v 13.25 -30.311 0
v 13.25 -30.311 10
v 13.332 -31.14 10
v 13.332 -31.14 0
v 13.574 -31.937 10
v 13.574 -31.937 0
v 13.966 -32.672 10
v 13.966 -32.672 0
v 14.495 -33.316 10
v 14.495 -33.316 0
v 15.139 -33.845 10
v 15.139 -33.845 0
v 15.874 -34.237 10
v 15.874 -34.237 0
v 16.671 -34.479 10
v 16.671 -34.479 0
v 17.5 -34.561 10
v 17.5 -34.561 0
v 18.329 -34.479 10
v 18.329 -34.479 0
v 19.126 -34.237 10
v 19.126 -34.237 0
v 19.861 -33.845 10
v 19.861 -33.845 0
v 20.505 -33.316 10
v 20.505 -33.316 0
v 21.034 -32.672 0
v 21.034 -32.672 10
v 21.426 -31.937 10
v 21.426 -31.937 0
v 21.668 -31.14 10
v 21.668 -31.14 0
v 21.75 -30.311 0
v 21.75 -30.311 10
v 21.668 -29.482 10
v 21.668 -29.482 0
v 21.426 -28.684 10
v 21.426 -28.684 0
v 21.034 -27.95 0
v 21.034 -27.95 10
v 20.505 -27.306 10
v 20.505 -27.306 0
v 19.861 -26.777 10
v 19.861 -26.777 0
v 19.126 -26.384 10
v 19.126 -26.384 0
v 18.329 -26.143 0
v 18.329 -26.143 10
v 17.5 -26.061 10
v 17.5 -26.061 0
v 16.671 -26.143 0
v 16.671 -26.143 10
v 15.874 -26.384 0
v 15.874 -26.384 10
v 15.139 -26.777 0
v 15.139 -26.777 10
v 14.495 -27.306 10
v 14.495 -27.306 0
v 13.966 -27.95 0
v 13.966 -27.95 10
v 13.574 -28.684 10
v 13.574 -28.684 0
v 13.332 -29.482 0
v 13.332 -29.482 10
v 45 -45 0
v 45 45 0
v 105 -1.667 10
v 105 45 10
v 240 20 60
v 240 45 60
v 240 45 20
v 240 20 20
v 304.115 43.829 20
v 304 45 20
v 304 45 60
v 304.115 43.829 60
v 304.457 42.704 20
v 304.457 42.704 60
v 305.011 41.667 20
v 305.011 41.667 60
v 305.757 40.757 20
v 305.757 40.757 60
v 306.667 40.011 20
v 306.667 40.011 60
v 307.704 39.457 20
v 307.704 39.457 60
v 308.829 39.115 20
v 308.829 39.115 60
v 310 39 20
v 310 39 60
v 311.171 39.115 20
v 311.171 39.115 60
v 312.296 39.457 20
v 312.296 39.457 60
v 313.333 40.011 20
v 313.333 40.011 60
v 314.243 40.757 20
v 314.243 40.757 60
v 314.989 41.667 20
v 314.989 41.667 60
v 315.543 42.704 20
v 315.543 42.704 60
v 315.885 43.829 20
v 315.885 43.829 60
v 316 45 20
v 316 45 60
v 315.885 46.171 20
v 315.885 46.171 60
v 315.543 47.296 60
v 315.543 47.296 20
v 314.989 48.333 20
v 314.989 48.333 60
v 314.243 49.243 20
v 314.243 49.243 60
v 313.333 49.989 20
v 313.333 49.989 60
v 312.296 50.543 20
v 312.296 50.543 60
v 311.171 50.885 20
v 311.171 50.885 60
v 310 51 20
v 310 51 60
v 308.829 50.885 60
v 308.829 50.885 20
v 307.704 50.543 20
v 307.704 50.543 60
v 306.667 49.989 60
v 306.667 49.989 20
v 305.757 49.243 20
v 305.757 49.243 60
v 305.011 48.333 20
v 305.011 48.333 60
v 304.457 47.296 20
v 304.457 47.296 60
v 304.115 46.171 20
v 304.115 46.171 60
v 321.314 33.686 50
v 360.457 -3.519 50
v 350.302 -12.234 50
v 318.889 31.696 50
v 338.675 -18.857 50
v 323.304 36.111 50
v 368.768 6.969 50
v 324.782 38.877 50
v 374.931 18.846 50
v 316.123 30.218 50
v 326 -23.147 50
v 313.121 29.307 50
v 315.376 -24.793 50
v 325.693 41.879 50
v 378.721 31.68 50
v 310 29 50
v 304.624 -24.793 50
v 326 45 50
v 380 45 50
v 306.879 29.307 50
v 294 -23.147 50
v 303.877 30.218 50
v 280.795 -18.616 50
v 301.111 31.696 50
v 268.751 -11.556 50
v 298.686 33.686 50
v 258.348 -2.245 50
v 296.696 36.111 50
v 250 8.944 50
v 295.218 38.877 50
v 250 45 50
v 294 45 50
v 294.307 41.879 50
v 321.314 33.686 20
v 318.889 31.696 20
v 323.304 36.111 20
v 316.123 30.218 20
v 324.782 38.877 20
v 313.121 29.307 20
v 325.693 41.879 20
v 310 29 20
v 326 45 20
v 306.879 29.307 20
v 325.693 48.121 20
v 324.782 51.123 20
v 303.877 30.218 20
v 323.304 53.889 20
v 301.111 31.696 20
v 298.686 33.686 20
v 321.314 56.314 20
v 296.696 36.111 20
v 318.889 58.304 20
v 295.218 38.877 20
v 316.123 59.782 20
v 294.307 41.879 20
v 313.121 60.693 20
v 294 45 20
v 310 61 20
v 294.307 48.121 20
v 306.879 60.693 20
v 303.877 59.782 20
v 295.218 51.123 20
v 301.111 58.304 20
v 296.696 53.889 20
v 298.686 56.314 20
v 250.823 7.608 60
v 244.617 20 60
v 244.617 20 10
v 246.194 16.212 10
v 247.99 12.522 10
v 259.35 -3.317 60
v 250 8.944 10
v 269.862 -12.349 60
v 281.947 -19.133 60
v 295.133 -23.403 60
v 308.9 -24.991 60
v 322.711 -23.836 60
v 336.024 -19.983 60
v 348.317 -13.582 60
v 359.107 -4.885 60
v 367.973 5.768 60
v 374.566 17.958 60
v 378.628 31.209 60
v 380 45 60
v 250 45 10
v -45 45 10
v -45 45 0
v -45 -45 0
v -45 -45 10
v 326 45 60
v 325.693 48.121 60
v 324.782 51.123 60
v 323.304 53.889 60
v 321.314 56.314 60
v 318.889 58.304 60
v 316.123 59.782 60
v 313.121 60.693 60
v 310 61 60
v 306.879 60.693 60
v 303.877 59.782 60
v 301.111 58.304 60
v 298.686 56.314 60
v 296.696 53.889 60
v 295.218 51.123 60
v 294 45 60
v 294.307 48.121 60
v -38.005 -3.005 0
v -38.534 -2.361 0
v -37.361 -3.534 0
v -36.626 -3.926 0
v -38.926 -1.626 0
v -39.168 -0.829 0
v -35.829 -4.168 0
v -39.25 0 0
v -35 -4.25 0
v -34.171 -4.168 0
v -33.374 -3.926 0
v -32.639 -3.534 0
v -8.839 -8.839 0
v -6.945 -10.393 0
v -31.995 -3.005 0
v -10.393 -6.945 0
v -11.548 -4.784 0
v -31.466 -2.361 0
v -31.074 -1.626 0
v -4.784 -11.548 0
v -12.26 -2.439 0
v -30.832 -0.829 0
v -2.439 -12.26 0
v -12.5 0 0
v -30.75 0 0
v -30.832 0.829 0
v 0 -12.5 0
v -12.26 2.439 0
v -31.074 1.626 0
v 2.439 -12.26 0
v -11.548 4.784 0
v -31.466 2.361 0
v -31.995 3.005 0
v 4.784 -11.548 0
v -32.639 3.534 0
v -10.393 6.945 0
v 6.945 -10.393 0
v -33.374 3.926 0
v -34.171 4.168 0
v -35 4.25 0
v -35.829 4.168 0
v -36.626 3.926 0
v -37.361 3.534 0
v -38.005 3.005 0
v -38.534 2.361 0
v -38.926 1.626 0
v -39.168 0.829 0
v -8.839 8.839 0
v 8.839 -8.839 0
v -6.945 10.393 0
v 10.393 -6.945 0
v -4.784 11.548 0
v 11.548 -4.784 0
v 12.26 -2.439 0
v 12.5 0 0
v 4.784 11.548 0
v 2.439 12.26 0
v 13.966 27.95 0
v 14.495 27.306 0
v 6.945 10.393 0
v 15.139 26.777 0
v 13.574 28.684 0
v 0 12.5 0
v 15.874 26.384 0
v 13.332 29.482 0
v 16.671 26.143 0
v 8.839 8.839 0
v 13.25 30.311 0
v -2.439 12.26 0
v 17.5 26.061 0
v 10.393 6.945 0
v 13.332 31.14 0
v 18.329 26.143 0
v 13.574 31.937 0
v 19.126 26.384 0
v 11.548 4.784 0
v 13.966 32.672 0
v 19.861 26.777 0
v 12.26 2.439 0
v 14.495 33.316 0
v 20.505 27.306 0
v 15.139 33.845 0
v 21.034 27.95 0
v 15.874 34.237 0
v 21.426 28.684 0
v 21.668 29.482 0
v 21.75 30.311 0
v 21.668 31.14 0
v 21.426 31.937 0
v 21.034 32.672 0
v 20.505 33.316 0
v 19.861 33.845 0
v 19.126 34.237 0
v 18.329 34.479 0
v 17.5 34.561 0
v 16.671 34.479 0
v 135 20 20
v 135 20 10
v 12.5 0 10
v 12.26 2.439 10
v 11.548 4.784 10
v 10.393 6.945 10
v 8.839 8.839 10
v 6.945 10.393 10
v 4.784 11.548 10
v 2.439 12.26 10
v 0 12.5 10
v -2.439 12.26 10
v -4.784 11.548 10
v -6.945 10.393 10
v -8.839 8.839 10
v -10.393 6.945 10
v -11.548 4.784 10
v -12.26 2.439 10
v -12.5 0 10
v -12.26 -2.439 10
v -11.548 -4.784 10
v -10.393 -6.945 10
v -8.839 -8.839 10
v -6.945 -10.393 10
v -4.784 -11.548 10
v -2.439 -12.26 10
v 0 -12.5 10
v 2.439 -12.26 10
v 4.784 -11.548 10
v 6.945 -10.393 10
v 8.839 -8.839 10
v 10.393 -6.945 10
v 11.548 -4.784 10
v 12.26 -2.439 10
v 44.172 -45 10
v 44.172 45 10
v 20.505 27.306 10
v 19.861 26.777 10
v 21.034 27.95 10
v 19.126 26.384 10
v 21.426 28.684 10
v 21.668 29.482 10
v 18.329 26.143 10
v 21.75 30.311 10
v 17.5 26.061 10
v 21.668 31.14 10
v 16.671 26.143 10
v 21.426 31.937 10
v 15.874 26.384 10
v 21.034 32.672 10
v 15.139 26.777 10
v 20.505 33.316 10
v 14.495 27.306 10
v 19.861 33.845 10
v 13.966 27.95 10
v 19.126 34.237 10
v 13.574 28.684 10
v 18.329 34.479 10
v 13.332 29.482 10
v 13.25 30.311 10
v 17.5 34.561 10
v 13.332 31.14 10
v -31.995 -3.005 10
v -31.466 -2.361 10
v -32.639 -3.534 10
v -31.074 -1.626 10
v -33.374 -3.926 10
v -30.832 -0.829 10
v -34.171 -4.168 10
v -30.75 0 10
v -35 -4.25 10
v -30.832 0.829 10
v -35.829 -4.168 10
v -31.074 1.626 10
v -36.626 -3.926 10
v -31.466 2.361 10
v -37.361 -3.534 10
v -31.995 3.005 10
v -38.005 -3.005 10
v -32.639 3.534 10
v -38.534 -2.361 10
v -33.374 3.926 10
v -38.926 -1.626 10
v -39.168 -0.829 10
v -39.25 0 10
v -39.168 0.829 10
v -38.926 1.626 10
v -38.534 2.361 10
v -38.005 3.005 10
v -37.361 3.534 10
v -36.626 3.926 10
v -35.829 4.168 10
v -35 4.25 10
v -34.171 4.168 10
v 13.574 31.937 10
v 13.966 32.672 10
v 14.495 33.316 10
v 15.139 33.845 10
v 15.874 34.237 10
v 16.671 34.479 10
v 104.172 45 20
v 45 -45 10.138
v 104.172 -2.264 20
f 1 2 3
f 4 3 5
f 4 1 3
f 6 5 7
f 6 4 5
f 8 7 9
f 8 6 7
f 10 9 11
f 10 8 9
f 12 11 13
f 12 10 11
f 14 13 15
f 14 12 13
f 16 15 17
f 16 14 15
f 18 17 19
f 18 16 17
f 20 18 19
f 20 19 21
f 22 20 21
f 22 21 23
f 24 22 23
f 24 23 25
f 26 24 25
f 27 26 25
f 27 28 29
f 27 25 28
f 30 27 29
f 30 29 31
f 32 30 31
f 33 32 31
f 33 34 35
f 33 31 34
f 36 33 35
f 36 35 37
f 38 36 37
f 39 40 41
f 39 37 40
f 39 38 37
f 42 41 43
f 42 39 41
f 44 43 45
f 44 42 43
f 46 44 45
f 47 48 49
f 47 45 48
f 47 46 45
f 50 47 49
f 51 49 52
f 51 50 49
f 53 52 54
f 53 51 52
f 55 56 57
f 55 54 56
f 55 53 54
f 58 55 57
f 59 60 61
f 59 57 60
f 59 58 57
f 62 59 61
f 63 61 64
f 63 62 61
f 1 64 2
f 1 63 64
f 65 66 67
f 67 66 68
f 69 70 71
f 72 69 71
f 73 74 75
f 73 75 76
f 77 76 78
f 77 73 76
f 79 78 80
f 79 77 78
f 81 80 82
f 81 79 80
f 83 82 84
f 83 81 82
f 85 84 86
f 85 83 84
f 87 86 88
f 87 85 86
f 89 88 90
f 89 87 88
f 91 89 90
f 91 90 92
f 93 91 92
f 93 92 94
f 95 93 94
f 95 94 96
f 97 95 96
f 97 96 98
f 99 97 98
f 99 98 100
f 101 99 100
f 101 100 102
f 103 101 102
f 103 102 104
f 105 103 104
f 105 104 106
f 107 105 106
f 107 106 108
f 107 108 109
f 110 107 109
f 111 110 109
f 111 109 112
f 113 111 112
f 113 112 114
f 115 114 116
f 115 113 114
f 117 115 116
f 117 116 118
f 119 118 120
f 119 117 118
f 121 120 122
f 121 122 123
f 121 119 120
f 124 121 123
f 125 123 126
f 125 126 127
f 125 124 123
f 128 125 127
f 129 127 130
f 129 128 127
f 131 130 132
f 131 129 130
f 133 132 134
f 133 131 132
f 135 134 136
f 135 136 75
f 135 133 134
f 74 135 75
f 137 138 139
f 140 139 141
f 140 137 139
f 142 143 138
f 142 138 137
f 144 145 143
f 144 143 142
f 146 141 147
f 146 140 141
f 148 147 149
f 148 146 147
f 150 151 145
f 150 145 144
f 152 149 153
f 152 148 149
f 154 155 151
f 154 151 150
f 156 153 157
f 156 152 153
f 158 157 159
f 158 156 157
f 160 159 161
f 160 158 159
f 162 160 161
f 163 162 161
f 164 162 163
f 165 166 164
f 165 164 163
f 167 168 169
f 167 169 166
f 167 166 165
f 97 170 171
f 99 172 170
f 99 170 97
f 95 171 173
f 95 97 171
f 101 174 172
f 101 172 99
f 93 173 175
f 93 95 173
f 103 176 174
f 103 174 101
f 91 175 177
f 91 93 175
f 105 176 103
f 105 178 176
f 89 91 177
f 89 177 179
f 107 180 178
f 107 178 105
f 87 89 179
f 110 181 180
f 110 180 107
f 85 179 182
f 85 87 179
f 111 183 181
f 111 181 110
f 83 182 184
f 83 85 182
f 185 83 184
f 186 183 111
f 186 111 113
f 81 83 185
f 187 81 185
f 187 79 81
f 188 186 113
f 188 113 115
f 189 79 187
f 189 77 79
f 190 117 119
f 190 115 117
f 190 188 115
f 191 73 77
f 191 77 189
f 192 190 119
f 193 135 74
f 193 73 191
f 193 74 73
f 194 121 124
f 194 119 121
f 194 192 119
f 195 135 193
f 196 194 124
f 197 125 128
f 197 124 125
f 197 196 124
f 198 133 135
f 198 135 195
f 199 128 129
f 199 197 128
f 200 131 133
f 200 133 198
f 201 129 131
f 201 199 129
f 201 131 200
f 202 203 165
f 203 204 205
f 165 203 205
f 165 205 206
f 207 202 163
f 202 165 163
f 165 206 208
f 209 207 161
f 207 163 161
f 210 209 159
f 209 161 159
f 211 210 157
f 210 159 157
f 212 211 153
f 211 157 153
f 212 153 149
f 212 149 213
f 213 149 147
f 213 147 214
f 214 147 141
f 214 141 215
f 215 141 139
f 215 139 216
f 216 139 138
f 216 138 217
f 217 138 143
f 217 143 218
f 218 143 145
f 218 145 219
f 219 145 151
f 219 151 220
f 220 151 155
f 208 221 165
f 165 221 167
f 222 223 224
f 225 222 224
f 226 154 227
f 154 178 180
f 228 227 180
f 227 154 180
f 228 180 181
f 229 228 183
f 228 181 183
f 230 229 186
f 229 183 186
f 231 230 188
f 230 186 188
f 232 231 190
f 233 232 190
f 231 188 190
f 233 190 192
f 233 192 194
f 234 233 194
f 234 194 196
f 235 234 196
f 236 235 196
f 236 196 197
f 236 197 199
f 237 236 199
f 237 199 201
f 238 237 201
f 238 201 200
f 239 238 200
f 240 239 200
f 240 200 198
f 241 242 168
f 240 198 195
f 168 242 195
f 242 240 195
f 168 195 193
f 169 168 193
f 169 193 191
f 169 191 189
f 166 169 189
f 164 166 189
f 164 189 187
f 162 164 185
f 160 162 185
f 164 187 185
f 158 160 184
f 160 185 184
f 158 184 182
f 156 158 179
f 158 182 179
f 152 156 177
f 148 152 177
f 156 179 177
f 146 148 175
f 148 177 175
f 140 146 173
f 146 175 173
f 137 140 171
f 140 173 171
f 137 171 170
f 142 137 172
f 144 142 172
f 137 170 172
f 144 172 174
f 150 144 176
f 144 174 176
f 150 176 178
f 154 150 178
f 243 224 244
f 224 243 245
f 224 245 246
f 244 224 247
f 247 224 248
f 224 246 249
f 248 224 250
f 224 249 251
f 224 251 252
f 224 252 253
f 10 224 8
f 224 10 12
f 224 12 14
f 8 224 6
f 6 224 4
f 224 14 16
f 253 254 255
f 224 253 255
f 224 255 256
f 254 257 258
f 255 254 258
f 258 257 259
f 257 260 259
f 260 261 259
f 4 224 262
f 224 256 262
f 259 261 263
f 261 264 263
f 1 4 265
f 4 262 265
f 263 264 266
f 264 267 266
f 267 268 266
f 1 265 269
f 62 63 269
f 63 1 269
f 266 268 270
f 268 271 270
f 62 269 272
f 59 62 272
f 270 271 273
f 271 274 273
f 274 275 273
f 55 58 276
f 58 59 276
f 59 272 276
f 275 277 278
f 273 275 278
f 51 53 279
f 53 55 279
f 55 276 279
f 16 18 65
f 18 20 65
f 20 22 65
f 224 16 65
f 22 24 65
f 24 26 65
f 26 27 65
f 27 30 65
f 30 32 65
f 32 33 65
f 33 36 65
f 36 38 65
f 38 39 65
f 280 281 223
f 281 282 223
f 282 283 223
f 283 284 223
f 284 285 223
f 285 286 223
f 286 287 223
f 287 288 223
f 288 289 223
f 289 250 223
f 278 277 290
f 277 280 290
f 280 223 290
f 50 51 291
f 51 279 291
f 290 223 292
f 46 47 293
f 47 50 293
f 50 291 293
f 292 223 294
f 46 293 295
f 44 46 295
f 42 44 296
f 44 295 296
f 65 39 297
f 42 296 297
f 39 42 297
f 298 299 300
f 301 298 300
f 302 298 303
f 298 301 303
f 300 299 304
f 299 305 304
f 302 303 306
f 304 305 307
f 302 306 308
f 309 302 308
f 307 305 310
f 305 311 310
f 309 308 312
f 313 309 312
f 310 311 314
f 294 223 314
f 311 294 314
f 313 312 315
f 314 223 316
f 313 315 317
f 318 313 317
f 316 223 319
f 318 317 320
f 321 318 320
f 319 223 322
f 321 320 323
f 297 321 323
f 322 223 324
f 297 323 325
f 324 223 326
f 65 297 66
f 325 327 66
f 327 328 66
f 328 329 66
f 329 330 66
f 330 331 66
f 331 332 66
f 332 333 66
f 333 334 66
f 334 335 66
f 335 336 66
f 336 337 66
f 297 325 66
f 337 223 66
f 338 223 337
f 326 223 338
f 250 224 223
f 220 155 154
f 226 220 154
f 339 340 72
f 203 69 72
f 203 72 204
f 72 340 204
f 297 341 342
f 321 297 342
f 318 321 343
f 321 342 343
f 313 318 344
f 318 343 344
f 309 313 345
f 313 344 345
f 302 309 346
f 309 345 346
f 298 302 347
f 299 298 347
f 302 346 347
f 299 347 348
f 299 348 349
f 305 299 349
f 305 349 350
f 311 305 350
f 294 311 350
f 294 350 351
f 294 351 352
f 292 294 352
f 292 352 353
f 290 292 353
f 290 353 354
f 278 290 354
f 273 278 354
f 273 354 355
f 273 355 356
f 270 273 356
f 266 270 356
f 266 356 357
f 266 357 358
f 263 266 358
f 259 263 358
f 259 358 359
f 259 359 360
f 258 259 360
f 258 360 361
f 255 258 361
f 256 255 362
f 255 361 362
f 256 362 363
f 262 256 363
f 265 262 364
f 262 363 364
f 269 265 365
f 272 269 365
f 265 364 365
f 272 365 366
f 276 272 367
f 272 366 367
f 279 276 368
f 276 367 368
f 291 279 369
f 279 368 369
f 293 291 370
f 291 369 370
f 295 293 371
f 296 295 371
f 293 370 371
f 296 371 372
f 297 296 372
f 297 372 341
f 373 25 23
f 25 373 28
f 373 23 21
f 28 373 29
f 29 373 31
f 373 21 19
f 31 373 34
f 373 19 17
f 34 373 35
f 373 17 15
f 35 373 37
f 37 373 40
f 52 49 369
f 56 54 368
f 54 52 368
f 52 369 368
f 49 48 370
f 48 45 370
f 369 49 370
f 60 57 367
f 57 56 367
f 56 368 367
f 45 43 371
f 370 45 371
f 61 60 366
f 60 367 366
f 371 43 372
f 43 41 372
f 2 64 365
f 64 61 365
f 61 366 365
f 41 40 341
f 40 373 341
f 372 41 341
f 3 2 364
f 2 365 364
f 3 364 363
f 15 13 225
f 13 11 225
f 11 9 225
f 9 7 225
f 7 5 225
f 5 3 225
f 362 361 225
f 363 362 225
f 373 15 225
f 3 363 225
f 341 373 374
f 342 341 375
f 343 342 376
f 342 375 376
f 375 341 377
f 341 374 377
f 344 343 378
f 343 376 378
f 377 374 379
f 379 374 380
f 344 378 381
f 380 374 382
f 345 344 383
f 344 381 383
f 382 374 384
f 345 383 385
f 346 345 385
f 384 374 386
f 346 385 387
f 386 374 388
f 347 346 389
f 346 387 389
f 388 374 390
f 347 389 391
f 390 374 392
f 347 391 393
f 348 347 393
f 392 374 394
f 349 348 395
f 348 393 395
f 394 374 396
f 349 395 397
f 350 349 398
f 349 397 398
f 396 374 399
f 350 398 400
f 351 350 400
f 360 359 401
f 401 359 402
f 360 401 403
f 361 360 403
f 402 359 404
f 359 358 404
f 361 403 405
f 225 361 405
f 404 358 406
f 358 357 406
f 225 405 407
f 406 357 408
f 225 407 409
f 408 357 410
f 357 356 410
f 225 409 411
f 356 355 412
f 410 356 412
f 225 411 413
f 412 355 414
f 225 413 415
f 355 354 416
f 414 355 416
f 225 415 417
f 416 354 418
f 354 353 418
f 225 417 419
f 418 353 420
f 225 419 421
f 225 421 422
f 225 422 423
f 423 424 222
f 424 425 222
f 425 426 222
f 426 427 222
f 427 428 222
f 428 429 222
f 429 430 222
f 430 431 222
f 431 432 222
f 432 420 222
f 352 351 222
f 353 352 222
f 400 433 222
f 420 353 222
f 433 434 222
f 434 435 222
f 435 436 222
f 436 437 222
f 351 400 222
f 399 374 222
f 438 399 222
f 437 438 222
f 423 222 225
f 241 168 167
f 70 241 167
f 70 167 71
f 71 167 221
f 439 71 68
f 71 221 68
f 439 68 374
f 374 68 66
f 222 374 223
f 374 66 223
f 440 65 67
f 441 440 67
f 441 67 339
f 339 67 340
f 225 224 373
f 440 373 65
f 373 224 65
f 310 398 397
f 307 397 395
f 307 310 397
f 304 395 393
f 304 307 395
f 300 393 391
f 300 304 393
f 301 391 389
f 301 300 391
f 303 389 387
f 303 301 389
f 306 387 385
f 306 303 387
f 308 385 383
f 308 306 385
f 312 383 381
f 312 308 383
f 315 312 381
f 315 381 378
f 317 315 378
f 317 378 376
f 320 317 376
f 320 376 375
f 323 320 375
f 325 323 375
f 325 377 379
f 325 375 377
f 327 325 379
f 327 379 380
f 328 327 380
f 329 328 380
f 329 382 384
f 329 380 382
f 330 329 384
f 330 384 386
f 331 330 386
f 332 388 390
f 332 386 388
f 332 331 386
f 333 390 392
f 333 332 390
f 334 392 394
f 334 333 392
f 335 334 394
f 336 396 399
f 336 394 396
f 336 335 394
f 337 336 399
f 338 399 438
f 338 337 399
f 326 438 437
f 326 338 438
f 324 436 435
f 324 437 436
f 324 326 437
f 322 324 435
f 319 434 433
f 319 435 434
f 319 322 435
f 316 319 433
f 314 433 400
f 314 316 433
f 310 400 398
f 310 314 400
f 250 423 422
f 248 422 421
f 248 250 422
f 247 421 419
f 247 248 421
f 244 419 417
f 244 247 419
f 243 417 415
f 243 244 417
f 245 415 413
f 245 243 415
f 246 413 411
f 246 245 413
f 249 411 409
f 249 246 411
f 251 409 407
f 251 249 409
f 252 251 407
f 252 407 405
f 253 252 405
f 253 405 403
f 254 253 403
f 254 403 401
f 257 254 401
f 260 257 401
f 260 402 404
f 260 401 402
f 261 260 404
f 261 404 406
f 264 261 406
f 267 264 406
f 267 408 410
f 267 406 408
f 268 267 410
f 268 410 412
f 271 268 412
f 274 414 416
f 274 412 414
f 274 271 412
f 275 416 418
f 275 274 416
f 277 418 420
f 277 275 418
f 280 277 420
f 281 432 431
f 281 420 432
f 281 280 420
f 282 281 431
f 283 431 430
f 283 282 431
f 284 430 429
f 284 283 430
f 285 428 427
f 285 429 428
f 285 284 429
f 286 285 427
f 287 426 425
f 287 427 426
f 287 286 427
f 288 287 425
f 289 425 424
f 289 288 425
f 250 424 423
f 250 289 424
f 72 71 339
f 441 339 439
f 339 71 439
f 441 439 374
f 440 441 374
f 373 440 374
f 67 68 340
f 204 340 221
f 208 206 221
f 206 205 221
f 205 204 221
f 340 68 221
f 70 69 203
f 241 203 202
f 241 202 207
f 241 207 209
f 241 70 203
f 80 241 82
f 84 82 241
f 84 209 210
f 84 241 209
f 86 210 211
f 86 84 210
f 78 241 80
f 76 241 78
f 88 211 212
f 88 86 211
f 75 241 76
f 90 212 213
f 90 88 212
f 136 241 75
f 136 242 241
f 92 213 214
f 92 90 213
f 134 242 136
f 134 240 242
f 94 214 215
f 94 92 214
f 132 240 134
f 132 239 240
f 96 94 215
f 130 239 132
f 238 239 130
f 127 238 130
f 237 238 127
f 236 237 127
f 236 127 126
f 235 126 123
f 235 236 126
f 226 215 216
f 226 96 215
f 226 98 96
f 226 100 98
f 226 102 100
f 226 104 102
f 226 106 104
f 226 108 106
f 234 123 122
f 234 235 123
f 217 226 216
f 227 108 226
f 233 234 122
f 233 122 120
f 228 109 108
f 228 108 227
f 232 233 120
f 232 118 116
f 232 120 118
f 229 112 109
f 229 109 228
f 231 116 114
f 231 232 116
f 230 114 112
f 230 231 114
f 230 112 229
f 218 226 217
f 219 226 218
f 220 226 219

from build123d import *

# Parameters (mm, degrees)
ESQUISSE1_R             = 6
ESQUISSE1_R_2           = 4.25
BASE_EXTRUSION_DEPTH    = 60
ENL_V_MAT_EXTRU_1_DEPTH = 396.094925303
ENL_V_MAT_EXTRU_2_DEPTH = 10
ENL_V_MAT_EXTRU_3_DEPTH = 40
ESQUISSE5_R             = 12.5
ENL_V_MAT_EXTRU_4_DEPTH = 389.099214119
ESQUISSE6_R             = 16
ESQUISSE6_R_2           = 6
ENL_V_MAT_EXTRU_5_DEPTH = 10


with BuildPart() as part:
    # Esquisse1 → Base-Extrusion (new body)
    with BuildSketch(Plane.XY):
        with BuildLine():
            Line((380, 45), (326, 45))
            ThreePointArc((326, 45), (310, 61), (294, 45))
            Line((294, 45), (-45, 45))
            Line((-45, 45), (-45, -45))
            Line((-45, -45), (45, -45))
            Line((45, -45), (135, 20))
            Line((135, 20), (244.616515847, 20))
            ThreePointArc((244.616515847, 20), (322.711335675, -23.836196477), (380, 45))
        make_face()
        with Locations(Location((310, 45, 0), (0, 0, 180))):
            Circle(ESQUISSE1_R, mode=Mode.SUBTRACT)
        with Locations(Location((-35, 0, 0), (0, 0, 180))):
            Circle(ESQUISSE1_R_2, mode=Mode.SUBTRACT)
        with Locations(Location((17.5, 30.310889132, 0), (0, 0, 180))):
            Circle(ESQUISSE1_R_2, mode=Mode.SUBTRACT)
        with Locations(Location((17.5, -30.310889132, 0), (0, 0, 180))):
            Circle(ESQUISSE1_R_2, mode=Mode.SUBTRACT)
    extrude(amount=BASE_EXTRUSION_DEPTH)

    # Esquisse2 → Enlèv. mat.-Extru.1 (cut, through all)
    with BuildSketch(Plane(origin=(0, 45, 0), x_dir=(-1, 0, 0), z_dir=(0, 1, 0))):
        Polygon((-294, 50), (-294, 10), (-326, 10), (-326, 50), (-380, 50), (-380, 0), (-45, 0), (-105, 10), (-250, 10), (-250, 50), align=None)
        Polygon((-240, 60), (-240, 20), (-104.172374697, 20), (-44.172374697, 10), (45, 10), (45, 60), align=None)
    extrude(amount=-ENL_V_MAT_EXTRU_1_DEPTH, mode=Mode.SUBTRACT)

    # Esquisse3 → Enlèv. mat.-Extru.2 (cut)
    with BuildSketch(Plane(origin=(0, 0, 0), x_dir=(-1, 0, 0), z_dir=(0, 0, -1))):
        with BuildLine():
            Line((-304, 45), (-294, 45))
            ThreePointArc((-294, 45), (-310, 61), (-326, 45))
            Line((-326, 45), (-316, 45))
            ThreePointArc((-316, 45), (-310, 51), (-304, 45))
        make_face()
    extrude(amount=-ENL_V_MAT_EXTRU_2_DEPTH, mode=Mode.SUBTRACT)

    # Esquisse4 → Enlèv. mat.-Extru.3 (cut)
    with BuildSketch(Plane(origin=(0, 0, 10), x_dir=(-1, 0, 0), z_dir=(0, 0, -1))):
        with BuildLine():
            ThreePointArc((-326, -23.14690015), (-310, -25), (-294, -23.14690015))
            Line((-294, -23.14690015), (-294, 45))
            ThreePointArc((-294, 45), (-310, 29), (-326, 45))
            Line((-326, 45), (-326, -23.14690015))
        make_face()
    extrude(amount=-ENL_V_MAT_EXTRU_3_DEPTH, mode=Mode.SUBTRACT)

    # Esquisse5 → Enlèv. mat.-Extru.4 (cut, through all)
    with BuildSketch(Plane.XY.offset(10)):
        Circle(ESQUISSE5_R)
    extrude(amount=-ENL_V_MAT_EXTRU_4_DEPTH, mode=Mode.SUBTRACT)

    # Esquisse6 → Enlèv. mat.-Extru.5 (cut)
    with BuildSketch(Plane(origin=(0, 0, 10), x_dir=(-1, 0, 0), z_dir=(0, 0, -1))):
        with Locations((-310, 45)):
            Circle(ESQUISSE6_R)
        with Locations((-310, 45)):
            Circle(ESQUISSE6_R_2, mode=Mode.SUBTRACT)
    extrude(amount=-ENL_V_MAT_EXTRU_5_DEPTH, mode=Mode.SUBTRACT)


solid = part.part
